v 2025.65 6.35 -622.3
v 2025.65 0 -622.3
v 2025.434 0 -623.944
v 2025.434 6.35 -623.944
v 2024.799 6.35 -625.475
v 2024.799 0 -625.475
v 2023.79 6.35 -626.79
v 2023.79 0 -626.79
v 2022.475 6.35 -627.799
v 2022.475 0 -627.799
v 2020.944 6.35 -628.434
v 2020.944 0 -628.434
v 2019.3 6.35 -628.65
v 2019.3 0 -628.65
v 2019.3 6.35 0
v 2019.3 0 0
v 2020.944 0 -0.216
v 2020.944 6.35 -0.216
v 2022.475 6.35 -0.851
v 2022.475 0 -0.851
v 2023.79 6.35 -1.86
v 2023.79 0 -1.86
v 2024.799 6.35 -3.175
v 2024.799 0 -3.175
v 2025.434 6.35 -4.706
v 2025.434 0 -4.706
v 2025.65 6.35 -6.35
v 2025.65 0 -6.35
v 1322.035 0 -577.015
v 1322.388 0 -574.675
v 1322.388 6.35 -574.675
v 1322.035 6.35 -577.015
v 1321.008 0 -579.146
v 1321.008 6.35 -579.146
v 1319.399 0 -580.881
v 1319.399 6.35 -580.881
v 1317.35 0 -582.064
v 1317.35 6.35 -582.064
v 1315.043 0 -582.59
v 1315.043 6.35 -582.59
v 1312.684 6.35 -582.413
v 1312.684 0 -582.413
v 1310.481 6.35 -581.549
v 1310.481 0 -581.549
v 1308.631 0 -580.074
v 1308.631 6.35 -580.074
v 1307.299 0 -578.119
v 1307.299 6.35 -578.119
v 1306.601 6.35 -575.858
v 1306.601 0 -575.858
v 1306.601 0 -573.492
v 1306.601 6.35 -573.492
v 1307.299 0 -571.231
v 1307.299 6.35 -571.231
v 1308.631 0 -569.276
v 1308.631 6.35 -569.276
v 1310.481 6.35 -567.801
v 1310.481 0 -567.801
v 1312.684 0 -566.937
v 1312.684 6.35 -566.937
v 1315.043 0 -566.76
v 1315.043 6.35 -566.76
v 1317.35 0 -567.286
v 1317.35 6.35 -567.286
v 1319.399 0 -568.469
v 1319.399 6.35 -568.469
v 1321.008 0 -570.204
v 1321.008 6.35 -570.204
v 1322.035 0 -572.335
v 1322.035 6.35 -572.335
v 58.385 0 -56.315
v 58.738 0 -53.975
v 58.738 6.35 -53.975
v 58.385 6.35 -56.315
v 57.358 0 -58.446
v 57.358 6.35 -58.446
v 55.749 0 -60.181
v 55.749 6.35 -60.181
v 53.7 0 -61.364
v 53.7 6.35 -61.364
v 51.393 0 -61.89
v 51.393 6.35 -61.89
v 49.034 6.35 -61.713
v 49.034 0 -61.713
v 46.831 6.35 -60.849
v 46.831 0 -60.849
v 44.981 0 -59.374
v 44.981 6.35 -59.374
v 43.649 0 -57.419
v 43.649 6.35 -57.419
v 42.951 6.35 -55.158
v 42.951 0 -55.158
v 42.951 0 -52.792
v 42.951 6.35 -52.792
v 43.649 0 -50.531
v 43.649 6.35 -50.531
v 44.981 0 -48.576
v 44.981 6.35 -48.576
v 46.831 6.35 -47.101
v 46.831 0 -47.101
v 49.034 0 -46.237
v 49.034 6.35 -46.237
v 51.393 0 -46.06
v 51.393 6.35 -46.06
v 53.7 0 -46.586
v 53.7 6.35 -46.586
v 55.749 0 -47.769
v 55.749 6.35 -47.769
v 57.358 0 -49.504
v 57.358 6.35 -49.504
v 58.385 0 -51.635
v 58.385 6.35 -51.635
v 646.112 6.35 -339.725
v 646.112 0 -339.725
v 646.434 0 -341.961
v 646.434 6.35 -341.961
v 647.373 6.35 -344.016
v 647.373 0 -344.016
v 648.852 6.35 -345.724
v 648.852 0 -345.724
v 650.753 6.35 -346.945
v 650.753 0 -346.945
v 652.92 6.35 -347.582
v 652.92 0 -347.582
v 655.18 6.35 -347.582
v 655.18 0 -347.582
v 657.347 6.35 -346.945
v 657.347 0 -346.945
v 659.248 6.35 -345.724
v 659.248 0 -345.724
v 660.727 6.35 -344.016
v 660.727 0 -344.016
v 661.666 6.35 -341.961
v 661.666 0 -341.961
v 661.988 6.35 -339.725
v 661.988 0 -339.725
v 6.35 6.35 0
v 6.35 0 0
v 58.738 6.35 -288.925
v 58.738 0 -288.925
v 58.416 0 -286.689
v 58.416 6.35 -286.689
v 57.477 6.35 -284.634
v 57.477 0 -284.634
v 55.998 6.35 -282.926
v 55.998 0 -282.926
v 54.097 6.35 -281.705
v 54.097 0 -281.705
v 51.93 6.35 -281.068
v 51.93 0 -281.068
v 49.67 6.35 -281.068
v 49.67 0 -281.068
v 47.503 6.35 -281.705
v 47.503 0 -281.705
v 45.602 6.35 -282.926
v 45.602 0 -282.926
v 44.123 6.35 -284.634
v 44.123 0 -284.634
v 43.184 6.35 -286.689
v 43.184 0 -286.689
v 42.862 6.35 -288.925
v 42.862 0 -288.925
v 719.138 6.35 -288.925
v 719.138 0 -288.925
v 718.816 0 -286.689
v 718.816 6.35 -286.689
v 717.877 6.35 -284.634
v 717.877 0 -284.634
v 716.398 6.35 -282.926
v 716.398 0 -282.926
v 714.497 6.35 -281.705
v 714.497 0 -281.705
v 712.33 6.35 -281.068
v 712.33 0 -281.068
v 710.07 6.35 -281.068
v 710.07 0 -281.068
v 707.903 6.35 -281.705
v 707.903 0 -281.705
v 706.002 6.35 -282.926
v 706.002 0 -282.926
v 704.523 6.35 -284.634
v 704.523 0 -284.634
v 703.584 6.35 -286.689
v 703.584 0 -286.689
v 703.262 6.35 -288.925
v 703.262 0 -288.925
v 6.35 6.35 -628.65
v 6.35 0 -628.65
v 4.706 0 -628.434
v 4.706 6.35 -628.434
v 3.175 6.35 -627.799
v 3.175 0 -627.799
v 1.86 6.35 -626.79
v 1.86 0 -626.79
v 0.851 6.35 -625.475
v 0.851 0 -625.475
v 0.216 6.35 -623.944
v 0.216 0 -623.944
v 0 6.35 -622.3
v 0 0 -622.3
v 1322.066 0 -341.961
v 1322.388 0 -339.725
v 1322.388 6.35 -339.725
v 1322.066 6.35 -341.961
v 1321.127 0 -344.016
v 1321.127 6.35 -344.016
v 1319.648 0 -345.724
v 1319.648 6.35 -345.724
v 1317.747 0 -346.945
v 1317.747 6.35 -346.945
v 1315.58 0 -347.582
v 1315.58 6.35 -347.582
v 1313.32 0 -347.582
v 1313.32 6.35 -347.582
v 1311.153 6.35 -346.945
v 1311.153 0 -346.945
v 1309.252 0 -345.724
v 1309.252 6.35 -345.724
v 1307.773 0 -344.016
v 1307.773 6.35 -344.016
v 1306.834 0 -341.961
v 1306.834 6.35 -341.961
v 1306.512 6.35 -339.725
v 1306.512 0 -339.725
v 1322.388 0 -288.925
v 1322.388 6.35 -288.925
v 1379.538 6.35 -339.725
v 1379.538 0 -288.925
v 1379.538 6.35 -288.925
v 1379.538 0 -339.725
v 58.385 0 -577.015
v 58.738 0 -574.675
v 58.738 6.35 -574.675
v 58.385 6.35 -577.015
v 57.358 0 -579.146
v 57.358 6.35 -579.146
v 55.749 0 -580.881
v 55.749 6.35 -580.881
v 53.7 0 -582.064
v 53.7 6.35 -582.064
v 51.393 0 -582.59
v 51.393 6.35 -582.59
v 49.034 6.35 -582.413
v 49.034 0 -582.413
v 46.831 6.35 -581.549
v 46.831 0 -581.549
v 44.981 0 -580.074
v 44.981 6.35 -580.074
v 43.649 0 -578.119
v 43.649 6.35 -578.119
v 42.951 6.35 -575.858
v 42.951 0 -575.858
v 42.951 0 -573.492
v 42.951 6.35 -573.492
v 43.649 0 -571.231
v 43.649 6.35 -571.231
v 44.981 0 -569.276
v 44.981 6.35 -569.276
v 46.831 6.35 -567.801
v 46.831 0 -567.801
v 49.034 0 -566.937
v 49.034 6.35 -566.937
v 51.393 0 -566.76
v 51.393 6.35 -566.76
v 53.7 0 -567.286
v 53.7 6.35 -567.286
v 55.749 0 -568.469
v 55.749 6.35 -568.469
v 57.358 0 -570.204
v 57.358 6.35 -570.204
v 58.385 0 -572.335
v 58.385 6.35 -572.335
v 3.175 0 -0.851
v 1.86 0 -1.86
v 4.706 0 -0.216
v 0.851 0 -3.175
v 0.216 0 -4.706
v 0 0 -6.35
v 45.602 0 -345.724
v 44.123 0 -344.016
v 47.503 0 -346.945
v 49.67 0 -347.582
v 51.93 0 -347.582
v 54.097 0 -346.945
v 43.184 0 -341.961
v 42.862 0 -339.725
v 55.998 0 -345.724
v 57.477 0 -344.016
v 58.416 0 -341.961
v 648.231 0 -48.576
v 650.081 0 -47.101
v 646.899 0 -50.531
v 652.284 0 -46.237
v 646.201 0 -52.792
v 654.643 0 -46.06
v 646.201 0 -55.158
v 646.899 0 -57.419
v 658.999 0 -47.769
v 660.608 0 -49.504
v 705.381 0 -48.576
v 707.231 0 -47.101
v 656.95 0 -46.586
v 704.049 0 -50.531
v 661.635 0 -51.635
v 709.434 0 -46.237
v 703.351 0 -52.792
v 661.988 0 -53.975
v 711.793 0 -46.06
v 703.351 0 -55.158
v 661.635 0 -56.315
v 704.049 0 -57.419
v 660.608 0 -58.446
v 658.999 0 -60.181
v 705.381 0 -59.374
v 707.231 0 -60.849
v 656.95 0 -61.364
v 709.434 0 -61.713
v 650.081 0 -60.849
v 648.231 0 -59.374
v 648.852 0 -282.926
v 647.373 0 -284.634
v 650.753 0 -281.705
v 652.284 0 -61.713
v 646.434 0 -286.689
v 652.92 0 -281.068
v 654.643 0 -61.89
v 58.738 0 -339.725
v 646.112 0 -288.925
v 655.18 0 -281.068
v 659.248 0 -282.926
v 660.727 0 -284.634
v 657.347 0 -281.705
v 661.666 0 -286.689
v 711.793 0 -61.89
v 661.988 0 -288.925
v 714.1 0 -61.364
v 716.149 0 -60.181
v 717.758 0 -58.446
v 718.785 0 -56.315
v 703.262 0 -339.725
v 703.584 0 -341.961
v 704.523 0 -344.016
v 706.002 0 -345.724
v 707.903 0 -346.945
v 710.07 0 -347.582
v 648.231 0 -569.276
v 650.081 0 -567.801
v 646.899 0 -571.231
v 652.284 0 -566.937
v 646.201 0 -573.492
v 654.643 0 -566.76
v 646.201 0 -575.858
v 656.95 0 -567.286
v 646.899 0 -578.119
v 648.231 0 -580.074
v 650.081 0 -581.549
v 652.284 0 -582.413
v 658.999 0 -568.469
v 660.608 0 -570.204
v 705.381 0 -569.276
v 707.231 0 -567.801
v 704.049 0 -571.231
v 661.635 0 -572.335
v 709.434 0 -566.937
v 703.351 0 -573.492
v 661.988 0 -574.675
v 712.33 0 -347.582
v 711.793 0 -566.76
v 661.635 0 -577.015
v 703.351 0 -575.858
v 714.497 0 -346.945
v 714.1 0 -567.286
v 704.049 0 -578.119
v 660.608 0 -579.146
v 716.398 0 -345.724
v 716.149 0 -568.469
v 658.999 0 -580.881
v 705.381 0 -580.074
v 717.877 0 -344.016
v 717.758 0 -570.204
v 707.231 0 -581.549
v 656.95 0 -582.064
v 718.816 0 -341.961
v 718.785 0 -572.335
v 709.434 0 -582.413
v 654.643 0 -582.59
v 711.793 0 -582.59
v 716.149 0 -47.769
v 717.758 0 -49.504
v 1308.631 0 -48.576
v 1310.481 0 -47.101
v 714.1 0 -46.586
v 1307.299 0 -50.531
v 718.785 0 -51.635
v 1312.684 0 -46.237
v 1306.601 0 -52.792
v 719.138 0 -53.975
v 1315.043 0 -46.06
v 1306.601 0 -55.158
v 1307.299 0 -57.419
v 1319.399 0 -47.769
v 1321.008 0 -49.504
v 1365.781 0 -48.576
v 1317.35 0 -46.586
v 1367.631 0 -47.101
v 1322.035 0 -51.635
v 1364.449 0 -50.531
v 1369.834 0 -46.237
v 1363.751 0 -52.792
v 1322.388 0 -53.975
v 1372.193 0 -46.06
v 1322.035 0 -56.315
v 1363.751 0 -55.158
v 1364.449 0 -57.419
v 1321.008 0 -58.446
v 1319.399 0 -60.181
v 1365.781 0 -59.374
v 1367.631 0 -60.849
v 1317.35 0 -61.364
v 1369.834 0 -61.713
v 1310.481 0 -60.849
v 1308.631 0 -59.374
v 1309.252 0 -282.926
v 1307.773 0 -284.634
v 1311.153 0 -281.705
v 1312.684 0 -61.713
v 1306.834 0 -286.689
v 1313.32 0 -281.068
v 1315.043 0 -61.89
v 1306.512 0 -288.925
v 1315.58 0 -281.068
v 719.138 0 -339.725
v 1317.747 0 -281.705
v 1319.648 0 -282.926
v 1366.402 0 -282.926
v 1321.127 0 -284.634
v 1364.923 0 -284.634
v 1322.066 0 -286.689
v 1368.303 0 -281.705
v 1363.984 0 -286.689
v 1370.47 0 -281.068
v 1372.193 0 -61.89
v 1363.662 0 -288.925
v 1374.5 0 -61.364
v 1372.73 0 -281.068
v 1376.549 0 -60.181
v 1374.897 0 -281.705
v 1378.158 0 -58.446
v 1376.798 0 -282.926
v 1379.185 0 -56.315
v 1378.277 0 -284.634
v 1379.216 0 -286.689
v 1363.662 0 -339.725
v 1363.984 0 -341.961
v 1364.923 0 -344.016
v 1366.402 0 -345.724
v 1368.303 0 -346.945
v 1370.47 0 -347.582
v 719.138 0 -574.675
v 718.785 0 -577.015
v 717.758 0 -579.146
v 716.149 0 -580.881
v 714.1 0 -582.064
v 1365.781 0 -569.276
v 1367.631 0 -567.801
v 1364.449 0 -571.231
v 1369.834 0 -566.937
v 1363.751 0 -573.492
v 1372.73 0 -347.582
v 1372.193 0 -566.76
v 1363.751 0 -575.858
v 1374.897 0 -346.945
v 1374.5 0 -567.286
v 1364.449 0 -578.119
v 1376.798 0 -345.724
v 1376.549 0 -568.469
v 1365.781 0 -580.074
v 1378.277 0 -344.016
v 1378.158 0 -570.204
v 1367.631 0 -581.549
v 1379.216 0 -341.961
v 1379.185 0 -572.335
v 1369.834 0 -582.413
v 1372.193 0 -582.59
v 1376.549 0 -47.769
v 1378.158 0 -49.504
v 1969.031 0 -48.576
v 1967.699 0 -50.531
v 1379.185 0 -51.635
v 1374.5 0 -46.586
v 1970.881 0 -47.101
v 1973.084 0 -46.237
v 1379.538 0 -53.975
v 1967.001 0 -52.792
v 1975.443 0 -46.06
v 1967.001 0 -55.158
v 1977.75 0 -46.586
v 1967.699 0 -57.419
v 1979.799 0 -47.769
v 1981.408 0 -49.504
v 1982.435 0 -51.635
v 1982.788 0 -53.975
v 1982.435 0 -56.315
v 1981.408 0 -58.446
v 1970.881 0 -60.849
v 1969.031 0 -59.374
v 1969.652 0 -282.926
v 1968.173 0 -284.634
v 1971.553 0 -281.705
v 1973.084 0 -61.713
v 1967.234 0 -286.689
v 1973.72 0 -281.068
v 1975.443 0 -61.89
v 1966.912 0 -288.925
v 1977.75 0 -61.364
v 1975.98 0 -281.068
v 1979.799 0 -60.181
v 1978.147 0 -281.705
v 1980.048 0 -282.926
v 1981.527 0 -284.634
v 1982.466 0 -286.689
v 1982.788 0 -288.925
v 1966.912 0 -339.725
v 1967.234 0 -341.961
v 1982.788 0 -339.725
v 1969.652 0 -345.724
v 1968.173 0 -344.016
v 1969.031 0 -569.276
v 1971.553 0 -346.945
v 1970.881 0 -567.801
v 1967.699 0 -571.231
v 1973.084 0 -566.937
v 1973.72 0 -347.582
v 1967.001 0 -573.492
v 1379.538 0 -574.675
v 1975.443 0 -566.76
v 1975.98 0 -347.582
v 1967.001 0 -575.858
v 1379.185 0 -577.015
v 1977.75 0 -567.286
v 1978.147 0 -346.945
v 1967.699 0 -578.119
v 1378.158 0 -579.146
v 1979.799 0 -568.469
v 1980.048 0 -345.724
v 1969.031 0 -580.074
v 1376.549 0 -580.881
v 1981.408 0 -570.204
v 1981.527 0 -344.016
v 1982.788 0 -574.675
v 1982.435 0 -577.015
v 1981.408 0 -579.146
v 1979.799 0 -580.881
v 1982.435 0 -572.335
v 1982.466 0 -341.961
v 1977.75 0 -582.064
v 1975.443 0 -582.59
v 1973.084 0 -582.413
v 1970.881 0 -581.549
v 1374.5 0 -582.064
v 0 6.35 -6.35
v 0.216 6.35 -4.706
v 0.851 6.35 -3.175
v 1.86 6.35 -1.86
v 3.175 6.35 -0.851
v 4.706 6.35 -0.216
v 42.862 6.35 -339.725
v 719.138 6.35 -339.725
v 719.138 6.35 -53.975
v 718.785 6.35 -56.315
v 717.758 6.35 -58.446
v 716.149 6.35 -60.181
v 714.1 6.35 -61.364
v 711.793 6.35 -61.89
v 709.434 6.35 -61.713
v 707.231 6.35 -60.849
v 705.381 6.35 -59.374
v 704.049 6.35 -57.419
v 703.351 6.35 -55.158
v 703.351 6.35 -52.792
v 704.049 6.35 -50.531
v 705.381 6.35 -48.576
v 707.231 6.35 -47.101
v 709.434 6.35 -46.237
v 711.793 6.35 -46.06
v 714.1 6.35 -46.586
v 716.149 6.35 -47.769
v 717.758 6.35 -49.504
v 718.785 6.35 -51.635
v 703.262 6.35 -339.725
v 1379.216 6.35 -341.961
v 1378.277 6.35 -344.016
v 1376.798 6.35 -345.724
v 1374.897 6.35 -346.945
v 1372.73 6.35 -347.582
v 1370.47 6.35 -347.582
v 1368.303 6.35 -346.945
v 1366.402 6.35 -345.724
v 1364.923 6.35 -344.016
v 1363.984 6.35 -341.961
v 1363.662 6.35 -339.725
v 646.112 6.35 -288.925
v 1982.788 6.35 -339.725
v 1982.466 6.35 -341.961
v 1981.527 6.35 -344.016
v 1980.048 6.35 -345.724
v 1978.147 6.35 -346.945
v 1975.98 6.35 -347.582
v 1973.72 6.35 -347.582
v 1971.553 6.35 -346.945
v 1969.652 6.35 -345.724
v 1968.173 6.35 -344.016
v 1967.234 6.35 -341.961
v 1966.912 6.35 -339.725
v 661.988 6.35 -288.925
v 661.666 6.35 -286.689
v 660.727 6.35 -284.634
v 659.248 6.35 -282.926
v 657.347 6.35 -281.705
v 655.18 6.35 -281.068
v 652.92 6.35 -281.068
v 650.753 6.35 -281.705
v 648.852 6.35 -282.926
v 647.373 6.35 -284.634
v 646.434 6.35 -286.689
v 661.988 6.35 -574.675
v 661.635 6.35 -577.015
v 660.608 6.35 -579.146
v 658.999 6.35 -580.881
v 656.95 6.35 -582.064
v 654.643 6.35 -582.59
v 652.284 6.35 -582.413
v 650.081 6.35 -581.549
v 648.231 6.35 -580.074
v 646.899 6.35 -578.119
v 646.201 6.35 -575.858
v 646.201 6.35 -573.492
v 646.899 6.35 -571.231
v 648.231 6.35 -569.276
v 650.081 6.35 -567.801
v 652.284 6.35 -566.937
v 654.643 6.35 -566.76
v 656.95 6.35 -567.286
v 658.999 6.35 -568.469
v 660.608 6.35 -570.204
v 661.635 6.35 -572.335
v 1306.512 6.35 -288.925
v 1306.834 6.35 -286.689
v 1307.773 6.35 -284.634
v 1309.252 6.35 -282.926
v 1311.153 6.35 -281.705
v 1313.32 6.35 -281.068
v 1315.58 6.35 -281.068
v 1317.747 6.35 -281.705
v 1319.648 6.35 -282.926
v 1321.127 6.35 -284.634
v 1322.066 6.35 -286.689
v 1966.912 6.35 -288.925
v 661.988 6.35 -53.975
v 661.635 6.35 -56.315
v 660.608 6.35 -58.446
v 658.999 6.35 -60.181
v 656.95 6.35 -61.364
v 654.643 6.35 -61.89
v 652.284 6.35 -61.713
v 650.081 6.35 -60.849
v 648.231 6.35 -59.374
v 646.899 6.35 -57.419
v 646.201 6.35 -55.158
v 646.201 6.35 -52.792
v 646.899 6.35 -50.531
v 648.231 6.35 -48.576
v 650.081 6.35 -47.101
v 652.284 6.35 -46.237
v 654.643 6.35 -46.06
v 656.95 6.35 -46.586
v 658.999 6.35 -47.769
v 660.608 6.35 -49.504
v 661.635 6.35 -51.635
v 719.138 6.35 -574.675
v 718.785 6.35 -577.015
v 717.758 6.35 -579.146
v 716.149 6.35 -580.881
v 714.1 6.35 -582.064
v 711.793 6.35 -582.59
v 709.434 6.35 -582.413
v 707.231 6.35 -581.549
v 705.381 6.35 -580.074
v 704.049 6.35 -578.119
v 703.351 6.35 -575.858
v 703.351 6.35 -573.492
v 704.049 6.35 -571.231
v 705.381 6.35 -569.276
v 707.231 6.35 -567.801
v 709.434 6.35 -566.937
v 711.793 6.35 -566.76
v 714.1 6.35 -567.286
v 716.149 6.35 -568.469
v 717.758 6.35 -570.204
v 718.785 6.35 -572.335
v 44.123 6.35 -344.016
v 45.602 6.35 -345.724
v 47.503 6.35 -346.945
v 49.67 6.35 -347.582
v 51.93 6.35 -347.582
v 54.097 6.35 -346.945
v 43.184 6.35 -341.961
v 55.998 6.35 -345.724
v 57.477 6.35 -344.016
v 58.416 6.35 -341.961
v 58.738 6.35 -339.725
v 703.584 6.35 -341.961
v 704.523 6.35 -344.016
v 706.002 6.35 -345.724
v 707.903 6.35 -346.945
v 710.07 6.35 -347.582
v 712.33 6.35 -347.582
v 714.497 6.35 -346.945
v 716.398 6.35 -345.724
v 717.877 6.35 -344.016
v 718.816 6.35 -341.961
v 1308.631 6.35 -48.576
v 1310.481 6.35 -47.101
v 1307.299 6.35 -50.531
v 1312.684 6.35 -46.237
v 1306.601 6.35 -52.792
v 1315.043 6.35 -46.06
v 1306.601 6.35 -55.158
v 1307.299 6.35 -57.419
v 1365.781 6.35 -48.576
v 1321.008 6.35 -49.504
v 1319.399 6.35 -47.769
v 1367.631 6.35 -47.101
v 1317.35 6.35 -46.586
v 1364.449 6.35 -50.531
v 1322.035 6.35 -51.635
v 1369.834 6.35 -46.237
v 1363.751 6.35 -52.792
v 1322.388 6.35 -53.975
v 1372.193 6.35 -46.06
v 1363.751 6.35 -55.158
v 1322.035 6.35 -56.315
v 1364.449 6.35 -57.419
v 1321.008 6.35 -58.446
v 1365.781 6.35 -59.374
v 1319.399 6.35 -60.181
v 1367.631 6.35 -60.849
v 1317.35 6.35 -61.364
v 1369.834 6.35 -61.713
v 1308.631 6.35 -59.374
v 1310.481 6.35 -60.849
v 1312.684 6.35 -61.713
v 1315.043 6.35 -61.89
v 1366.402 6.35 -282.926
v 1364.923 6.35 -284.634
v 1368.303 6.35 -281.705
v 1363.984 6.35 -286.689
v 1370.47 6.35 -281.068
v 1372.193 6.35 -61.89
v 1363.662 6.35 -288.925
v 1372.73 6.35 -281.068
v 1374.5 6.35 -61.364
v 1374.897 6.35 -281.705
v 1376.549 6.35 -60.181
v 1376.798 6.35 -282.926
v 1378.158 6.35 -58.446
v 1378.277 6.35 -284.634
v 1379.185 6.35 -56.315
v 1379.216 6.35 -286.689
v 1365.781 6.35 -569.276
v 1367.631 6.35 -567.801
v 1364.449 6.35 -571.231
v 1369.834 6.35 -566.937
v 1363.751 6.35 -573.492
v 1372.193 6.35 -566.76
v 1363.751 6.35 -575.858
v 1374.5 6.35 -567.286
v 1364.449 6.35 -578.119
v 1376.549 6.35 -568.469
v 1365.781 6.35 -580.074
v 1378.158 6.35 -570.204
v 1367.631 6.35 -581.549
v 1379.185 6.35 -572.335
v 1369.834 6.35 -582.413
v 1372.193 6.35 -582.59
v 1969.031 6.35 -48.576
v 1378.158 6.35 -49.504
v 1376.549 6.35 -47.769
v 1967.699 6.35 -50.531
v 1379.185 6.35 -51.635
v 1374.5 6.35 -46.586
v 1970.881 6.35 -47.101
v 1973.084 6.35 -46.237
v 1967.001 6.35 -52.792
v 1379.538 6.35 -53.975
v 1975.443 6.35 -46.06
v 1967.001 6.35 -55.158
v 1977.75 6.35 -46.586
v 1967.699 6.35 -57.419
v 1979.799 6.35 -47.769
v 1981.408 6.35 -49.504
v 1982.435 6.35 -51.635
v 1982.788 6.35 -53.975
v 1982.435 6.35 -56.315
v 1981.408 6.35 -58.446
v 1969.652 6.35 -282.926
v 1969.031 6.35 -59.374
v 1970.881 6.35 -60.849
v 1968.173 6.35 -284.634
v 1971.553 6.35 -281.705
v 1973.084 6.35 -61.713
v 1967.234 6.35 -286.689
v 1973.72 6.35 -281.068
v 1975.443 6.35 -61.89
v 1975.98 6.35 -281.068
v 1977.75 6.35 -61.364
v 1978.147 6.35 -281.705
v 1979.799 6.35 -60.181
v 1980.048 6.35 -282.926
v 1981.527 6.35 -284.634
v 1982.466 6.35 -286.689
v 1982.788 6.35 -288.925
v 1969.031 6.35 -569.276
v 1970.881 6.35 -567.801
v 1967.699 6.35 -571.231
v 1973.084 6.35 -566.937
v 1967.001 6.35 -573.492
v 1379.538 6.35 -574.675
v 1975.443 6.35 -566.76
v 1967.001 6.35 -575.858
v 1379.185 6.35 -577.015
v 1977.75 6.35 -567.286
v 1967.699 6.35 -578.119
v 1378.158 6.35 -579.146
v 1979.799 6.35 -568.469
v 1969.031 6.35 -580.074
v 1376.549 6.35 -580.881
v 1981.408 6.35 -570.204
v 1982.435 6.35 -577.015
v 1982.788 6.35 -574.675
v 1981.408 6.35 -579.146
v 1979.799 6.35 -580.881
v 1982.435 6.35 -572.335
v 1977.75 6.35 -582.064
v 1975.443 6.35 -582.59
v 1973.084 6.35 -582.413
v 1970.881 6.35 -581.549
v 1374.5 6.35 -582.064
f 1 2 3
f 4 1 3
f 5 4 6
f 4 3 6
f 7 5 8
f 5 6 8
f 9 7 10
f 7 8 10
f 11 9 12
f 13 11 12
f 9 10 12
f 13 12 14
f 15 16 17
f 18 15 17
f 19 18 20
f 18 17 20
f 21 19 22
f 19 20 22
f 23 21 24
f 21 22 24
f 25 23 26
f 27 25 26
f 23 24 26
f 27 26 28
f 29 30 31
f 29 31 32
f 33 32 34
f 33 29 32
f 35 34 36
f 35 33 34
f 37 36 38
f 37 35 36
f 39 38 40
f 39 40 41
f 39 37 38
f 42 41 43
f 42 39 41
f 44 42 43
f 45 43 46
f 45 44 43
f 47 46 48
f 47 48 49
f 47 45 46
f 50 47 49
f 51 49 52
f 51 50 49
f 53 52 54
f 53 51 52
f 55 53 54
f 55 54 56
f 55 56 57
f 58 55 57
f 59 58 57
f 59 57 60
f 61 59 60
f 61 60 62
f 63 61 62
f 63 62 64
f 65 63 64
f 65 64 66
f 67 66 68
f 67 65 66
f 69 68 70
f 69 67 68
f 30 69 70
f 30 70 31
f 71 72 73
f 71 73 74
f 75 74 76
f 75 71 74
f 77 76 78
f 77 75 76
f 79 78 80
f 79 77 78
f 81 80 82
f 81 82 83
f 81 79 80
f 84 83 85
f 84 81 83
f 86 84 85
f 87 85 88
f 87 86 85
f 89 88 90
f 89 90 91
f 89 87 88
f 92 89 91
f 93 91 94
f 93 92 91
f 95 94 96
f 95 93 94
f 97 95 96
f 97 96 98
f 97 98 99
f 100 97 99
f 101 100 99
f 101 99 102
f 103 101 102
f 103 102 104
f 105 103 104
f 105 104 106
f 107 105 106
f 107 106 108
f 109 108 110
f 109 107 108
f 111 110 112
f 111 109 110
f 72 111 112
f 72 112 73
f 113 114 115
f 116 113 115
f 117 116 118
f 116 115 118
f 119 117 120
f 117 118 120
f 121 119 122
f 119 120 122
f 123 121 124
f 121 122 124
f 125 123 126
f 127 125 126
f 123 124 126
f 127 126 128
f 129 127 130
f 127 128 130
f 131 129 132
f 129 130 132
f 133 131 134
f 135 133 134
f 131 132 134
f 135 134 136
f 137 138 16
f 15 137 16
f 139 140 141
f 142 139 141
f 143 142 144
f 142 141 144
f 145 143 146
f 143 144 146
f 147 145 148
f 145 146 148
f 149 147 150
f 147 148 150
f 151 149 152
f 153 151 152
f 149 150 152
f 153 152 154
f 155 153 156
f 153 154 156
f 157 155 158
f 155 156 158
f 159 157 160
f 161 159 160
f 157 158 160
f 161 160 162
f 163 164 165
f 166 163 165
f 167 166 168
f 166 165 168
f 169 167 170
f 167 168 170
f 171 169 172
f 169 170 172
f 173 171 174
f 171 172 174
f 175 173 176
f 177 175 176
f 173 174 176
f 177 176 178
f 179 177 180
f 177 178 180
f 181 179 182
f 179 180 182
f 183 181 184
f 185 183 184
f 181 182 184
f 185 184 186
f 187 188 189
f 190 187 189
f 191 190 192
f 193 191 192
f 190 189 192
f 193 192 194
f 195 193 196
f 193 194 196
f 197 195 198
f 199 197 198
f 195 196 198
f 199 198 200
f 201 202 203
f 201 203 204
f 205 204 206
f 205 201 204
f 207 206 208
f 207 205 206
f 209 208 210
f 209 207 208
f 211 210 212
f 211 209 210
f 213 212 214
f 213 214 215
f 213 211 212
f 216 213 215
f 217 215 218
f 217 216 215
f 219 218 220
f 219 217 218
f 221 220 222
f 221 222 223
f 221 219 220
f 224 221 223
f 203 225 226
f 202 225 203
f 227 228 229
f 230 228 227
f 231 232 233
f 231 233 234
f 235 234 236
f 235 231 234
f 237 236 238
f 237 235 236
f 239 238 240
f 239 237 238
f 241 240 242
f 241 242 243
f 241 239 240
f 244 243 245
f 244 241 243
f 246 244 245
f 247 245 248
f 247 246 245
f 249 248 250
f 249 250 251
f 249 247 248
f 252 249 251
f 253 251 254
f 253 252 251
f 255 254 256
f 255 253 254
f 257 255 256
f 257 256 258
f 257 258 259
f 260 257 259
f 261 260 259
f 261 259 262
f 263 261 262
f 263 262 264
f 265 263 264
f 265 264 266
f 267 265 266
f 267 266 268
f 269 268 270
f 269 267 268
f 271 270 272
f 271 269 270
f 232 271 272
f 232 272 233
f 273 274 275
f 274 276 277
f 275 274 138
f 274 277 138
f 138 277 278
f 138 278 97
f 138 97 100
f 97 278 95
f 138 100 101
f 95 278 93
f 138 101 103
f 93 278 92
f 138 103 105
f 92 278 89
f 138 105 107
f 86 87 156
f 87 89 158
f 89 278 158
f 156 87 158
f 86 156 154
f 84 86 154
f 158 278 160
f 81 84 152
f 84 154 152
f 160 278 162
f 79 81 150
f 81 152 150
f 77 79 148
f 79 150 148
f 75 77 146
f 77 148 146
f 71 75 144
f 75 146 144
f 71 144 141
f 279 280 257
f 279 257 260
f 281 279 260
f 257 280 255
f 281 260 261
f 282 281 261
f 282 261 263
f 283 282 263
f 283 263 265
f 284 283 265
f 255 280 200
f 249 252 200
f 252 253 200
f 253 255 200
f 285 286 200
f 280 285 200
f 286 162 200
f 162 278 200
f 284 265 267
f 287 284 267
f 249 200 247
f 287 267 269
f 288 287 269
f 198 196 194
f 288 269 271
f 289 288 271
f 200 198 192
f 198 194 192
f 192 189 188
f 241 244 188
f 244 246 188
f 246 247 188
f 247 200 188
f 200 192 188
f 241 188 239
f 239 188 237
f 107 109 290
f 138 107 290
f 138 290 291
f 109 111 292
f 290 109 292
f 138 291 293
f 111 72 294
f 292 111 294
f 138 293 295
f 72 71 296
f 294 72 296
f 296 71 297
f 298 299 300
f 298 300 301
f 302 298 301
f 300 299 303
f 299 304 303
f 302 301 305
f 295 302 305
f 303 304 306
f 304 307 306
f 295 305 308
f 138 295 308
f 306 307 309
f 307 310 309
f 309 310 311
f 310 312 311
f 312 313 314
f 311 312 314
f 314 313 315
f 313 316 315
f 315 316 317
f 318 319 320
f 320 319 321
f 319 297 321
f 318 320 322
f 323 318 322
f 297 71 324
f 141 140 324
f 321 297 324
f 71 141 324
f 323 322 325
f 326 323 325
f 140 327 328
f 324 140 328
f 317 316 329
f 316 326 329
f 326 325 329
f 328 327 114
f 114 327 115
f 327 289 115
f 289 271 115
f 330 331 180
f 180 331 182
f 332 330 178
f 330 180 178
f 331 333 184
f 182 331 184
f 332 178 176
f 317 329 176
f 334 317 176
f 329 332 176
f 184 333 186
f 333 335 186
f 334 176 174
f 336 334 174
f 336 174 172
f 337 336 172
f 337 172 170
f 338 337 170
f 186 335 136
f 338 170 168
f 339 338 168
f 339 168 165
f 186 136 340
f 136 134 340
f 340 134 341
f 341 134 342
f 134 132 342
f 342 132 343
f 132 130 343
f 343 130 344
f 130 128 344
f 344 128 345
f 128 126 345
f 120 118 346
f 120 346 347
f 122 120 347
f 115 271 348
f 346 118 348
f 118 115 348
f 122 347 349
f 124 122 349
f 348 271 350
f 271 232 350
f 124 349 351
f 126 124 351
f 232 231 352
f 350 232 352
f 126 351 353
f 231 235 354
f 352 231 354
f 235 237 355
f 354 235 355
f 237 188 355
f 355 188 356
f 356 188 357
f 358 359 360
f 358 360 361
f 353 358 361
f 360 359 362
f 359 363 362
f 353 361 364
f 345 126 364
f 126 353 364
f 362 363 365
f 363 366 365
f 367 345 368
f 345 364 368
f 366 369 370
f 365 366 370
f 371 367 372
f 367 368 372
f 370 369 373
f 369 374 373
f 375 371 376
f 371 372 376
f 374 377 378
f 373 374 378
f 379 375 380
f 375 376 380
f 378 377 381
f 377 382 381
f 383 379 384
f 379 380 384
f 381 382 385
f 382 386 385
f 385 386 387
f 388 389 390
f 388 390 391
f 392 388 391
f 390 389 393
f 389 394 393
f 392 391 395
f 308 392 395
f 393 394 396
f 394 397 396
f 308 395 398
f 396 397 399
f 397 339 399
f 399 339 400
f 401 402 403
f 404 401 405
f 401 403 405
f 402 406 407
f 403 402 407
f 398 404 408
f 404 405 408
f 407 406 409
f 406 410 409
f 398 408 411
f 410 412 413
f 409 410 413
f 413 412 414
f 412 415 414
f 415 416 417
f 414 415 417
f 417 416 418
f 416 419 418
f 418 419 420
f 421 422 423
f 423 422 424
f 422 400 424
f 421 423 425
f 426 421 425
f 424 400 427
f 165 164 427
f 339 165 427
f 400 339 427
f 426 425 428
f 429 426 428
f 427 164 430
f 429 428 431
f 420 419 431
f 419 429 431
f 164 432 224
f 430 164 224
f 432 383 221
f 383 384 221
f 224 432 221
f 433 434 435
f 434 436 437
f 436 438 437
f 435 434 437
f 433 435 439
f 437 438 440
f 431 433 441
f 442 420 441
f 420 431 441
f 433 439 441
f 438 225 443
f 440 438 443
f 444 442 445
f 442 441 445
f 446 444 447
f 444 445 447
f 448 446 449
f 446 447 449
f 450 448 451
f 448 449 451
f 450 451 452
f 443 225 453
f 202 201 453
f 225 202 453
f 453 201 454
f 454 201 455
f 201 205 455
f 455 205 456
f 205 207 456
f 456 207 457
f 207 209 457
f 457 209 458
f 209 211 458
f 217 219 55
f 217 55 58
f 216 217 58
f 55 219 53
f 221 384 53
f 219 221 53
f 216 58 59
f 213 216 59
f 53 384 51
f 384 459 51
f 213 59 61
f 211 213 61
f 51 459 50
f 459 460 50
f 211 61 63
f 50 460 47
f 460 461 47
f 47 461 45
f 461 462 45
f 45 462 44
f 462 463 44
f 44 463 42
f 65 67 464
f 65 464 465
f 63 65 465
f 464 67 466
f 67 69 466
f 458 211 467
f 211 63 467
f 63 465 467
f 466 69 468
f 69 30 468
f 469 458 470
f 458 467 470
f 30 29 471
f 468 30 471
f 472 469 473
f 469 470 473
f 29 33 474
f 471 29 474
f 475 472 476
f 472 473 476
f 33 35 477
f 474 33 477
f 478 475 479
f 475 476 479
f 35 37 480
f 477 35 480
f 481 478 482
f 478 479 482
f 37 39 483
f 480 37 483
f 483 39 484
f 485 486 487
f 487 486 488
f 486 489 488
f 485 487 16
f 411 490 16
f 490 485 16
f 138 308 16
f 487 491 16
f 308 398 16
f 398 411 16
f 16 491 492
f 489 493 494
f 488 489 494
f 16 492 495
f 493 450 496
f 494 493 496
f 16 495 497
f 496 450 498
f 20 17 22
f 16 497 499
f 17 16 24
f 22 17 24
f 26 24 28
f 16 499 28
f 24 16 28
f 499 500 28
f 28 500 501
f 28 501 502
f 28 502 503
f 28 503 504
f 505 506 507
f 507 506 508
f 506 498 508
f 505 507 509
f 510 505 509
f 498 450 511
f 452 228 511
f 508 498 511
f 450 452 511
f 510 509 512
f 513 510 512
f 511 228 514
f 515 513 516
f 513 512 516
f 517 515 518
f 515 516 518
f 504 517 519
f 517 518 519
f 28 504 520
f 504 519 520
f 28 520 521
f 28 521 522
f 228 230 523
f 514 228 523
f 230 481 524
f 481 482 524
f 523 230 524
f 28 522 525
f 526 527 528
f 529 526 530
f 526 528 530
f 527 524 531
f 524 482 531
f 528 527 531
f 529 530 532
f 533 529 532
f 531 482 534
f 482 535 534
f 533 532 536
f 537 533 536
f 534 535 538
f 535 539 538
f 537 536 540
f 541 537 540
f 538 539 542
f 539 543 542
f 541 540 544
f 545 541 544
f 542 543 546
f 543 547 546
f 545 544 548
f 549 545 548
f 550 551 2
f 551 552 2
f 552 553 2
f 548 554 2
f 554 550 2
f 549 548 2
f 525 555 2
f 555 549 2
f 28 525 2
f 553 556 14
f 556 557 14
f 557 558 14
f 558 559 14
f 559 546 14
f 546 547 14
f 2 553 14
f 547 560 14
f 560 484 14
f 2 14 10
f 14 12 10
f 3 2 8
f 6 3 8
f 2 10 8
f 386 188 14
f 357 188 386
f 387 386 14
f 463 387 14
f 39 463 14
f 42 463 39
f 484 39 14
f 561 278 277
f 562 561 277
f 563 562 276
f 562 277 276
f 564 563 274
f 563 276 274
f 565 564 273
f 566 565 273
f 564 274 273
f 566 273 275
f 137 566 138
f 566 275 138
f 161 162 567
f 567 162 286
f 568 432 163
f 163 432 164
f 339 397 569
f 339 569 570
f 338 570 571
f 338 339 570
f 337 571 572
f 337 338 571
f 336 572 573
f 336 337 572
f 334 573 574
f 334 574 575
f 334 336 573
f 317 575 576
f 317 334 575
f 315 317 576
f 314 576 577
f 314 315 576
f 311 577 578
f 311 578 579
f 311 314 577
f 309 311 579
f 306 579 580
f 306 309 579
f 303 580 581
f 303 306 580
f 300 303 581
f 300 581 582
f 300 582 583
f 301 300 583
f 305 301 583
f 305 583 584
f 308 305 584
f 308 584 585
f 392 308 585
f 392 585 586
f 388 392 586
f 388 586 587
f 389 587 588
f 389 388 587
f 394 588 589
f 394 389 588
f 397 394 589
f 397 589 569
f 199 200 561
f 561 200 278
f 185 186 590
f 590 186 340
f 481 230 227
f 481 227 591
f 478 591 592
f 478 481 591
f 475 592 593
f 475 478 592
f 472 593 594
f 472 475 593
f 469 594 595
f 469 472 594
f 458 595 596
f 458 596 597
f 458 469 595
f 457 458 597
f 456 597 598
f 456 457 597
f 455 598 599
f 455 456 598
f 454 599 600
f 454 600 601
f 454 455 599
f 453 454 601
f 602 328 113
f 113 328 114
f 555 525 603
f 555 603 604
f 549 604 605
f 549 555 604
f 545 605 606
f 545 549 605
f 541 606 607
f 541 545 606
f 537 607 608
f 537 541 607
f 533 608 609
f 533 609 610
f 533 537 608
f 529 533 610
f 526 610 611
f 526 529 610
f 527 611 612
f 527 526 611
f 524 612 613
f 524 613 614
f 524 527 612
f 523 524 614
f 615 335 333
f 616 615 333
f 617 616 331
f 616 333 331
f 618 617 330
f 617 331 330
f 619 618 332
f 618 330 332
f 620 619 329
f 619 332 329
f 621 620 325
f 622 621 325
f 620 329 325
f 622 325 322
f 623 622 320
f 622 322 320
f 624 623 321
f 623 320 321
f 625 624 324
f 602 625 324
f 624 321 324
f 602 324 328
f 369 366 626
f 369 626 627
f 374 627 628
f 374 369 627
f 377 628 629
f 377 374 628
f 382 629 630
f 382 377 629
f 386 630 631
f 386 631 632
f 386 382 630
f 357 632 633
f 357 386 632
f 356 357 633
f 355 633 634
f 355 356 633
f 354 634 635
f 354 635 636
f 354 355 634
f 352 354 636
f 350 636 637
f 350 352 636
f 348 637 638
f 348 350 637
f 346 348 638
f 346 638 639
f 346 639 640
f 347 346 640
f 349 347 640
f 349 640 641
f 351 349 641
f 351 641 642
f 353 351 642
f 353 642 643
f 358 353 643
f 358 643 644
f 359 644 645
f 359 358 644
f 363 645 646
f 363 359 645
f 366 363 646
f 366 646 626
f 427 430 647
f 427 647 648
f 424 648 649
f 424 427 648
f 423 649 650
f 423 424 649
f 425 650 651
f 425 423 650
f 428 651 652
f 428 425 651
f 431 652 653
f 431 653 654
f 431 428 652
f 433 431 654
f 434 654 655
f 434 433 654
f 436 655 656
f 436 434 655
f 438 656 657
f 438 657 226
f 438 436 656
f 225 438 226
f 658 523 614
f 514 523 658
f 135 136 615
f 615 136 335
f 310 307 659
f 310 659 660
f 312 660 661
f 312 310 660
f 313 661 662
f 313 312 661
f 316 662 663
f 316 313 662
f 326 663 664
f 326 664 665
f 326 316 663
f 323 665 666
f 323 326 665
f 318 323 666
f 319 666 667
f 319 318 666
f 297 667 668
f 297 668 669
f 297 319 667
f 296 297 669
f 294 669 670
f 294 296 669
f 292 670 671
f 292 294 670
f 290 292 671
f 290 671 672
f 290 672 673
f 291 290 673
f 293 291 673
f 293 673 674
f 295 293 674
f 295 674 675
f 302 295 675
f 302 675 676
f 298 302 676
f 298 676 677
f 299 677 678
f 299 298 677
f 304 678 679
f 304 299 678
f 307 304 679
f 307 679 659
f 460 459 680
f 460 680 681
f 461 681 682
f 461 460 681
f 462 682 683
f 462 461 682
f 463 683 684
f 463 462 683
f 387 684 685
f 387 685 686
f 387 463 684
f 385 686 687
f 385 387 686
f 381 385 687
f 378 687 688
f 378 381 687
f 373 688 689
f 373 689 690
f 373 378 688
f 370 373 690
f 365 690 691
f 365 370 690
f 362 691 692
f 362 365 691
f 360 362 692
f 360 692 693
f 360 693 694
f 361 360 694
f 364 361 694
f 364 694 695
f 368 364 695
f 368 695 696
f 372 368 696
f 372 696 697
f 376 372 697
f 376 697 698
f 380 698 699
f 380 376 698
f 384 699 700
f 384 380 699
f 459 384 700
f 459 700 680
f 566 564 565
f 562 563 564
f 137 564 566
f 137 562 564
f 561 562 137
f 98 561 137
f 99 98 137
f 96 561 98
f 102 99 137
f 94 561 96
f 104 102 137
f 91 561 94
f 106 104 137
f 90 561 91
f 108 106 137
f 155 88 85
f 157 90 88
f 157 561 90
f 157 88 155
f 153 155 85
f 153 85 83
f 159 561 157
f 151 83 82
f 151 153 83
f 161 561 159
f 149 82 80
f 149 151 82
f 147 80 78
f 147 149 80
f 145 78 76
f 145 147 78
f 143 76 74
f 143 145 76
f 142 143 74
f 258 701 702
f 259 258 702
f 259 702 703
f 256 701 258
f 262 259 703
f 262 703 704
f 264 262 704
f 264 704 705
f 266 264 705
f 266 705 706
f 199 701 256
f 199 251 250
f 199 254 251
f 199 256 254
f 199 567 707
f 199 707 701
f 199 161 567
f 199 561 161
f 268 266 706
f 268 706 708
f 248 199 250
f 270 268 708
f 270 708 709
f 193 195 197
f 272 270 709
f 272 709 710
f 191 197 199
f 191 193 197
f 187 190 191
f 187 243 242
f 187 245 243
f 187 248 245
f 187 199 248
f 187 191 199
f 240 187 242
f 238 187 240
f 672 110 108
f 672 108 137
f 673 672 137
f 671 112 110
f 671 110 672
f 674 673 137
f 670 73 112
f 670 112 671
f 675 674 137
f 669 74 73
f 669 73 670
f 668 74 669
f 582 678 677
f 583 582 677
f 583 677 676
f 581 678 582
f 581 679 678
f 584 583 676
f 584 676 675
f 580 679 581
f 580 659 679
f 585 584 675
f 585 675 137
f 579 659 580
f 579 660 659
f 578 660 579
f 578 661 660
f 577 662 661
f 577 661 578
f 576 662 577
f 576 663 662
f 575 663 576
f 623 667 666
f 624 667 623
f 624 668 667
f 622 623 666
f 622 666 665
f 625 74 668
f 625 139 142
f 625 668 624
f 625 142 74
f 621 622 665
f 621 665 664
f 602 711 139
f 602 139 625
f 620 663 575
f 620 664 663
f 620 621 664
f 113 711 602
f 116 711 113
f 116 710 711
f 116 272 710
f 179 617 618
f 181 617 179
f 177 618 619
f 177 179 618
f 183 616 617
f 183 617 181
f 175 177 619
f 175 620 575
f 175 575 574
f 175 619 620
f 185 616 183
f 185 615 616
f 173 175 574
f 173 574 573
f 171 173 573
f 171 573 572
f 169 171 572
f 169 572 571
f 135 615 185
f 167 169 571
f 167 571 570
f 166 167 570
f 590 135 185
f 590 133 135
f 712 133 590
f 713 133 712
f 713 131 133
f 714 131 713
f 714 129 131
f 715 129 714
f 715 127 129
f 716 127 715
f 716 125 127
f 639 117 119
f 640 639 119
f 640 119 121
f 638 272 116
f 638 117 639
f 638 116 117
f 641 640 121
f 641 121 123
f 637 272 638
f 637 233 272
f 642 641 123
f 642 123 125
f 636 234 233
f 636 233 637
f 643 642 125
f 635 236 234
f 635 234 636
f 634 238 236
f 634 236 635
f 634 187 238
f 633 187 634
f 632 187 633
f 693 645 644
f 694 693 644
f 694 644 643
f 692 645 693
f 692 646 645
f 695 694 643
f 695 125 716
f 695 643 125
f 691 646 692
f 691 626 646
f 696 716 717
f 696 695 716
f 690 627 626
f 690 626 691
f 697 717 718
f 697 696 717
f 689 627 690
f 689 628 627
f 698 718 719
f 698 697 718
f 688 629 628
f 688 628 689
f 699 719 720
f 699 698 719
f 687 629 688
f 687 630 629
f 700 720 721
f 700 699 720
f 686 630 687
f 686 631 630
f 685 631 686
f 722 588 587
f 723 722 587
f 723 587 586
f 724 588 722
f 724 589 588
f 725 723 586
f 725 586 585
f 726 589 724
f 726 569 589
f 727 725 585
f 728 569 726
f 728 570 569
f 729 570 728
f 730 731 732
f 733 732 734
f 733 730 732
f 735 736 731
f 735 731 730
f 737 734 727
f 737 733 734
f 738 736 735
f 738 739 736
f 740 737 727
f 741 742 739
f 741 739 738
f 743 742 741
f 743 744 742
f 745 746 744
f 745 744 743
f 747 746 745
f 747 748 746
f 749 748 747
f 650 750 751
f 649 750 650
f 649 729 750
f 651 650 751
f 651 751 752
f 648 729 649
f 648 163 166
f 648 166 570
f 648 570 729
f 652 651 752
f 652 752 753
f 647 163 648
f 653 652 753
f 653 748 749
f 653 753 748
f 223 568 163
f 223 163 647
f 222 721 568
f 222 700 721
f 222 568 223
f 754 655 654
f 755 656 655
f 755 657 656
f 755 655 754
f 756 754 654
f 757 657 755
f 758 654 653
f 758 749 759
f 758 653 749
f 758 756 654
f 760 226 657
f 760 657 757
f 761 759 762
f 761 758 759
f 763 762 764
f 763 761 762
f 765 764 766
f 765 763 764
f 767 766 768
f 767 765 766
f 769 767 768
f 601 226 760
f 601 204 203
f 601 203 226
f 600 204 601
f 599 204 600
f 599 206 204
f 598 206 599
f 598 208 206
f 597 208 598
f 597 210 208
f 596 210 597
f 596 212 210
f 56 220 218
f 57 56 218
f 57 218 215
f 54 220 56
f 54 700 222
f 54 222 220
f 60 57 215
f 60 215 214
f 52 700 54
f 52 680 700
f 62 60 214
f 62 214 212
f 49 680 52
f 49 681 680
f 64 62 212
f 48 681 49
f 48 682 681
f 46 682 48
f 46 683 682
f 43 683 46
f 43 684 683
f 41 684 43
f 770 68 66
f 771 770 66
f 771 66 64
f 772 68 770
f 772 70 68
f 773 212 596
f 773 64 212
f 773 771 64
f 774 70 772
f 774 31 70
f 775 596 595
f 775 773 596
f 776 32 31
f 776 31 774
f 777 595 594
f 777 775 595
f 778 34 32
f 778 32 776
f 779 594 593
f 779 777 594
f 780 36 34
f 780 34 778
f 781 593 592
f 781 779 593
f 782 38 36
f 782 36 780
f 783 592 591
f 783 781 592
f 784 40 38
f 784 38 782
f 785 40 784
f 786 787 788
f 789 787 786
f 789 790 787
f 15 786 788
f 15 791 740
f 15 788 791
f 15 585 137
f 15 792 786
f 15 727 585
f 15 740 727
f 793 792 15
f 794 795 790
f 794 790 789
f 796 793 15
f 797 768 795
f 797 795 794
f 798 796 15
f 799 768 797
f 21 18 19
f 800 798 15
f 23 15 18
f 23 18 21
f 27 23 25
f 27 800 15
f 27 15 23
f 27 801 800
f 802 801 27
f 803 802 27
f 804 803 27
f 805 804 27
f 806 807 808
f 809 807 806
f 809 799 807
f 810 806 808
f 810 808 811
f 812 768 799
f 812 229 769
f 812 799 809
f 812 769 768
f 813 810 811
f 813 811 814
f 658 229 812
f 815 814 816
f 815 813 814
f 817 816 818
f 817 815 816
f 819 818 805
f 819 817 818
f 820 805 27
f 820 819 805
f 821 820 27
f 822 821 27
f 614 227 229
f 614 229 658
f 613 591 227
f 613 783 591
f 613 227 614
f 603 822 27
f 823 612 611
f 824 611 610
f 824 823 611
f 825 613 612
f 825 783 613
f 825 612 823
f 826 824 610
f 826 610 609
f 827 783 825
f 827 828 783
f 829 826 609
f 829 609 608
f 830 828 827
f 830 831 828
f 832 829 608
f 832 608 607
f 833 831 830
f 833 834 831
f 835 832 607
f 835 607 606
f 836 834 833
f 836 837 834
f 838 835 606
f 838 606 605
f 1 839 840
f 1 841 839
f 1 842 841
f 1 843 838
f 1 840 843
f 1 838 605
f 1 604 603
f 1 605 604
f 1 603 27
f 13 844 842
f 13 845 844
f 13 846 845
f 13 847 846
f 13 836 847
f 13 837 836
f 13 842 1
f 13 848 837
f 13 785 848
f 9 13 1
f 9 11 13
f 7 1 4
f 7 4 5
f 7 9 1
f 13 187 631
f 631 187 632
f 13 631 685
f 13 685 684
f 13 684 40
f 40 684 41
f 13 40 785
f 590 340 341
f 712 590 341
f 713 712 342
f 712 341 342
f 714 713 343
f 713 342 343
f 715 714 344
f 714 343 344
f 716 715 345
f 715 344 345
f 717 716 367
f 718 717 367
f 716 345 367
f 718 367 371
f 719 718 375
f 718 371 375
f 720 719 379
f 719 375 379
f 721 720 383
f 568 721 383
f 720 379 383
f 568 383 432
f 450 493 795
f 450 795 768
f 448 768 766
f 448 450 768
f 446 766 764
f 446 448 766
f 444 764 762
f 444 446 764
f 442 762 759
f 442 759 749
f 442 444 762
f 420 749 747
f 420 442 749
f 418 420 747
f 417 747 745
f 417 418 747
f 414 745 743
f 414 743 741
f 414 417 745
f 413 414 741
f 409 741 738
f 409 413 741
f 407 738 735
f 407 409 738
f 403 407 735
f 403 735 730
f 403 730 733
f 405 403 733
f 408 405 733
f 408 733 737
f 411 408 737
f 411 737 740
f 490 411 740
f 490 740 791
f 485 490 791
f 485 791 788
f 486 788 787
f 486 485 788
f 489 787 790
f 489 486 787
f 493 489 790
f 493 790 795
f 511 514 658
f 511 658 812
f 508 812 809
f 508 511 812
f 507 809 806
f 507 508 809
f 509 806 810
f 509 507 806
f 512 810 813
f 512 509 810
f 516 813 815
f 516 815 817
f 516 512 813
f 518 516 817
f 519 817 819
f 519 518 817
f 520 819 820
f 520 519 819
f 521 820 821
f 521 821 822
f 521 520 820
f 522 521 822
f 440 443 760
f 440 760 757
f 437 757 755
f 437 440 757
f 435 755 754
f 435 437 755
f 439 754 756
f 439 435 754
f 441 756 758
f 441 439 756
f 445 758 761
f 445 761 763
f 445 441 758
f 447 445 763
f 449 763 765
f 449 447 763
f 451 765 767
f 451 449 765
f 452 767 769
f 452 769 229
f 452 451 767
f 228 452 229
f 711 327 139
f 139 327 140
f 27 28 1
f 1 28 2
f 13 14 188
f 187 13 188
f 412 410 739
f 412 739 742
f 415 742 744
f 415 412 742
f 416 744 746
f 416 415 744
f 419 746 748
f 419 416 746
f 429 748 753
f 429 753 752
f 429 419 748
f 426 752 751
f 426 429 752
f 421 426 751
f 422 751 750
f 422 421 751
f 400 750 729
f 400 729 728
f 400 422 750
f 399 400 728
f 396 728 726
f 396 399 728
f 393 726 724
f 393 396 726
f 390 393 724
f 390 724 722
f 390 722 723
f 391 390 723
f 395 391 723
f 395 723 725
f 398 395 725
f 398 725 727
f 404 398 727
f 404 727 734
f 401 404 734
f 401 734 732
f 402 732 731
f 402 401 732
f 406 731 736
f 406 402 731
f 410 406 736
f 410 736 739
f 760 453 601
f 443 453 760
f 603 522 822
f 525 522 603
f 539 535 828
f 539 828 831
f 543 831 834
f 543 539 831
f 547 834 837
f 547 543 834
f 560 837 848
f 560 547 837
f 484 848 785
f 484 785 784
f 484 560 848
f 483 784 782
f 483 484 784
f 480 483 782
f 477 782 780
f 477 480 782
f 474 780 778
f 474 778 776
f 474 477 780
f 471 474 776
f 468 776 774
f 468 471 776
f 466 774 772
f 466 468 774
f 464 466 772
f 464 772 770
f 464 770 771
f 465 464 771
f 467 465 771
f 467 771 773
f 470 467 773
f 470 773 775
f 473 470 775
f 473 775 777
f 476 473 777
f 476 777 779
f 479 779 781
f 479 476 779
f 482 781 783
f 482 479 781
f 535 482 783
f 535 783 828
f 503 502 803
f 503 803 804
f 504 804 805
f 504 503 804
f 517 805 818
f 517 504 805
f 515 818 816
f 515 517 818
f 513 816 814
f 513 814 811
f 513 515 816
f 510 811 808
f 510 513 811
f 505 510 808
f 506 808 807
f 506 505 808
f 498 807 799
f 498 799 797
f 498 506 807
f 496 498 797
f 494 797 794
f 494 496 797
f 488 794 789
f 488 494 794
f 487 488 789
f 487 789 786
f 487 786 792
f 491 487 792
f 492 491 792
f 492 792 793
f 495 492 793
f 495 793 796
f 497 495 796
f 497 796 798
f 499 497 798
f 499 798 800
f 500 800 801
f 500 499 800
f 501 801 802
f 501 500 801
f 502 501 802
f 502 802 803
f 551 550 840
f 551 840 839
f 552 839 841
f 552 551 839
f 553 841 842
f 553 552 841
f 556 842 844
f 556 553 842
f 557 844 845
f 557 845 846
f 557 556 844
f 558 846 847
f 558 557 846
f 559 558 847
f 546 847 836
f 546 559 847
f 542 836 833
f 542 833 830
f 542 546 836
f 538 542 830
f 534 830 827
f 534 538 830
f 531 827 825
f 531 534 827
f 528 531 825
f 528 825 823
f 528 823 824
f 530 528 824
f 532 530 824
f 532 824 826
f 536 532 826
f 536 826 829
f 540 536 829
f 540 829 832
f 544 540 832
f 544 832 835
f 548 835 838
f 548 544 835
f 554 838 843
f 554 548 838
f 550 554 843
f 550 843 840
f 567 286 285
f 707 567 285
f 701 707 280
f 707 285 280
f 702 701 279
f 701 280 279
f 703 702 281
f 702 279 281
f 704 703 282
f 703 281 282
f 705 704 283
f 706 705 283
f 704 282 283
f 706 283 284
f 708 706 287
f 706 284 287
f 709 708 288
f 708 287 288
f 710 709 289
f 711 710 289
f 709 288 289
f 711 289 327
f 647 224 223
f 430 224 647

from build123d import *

# Parameters (mm, degrees)
SKETCH1_R           = 7.9375
BOSS_EXTRUDE1_DEPTH = 6.35


with BuildPart() as part:
    # Sketch1 → Boss-Extrude1 (new body)
    with BuildSketch(Plane(origin=(0, 0, 0), x_dir=(1, 0, 0), z_dir=(0, 1, 0))):
        with BuildLine():
            Line((6.35, 0), (2019.3, 0))
            ThreePointArc((2019.3, 0), (2023.790128061, 1.859871939), (2025.65, 6.35))
            Line((2025.65, 6.35), (2025.65, 622.3))
            ThreePointArc((2025.65, 622.3), (2023.790128061, 626.790128061), (2019.3, 628.65))
            Line((2019.3, 628.65), (6.35, 628.65))
            ThreePointArc((6.35, 628.65), (1.859871939, 626.790128061), (0, 622.3))
            Line((0, 622.3), (0, 6.35))
            ThreePointArc((0, 6.35), (1.859871939, 1.859871939), (6.35, 0))
        make_face()
        with Locations((50.8, 574.675)):
            Circle(SKETCH1_R, mode=Mode.SUBTRACT)
        with Locations((1974.85, 574.675)):
            Circle(SKETCH1_R, mode=Mode.SUBTRACT)
        with Locations((1974.85, 53.975)):
            Circle(SKETCH1_R, mode=Mode.SUBTRACT)
        with Locations((50.8, 53.975)):
            Circle(SKETCH1_R, mode=Mode.SUBTRACT)
        with Locations((654.05, 574.675)):
            Circle(SKETCH1_R, mode=Mode.SUBTRACT)
        with Locations((1371.6, 574.675)):
            Circle(SKETCH1_R, mode=Mode.SUBTRACT)
        with Locations((711.2, 574.675)):
            Circle(SKETCH1_R, mode=Mode.SUBTRACT)
        with Locations((711.2, 53.975)):
            Circle(SKETCH1_R, mode=Mode.SUBTRACT)
        with Locations((654.05, 53.975)):
            Circle(SKETCH1_R, mode=Mode.SUBTRACT)
        with Locations((1314.45, 574.675)):
            Circle(SKETCH1_R, mode=Mode.SUBTRACT)
        with Locations((1314.45, 53.975)):
            Circle(SKETCH1_R, mode=Mode.SUBTRACT)
        with Locations((1371.6, 53.975)):
            Circle(SKETCH1_R, mode=Mode.SUBTRACT)
        with BuildLine():
            Line((58.7375, 339.725), (58.7375, 288.925))
            ThreePointArc((58.7375, 288.925), (50.8, 280.9875), (42.8625, 288.925))
            Line((42.8625, 288.925), (42.8625, 339.725))
            ThreePointArc((42.8625, 339.725), (50.8, 347.6625), (58.7375, 339.725))
        make_face(mode=Mode.SUBTRACT)
        with BuildLine():
            Line((661.9875, 339.725), (661.9875, 288.925))
            ThreePointArc((661.9875, 288.925), (654.05, 280.9875), (646.1125, 288.925))
            Line((646.1125, 288.925), (646.1125, 339.725))
            ThreePointArc((646.1125, 339.725), (654.05, 347.6625), (661.9875, 339.725))
        make_face(mode=Mode.SUBTRACT)
        with BuildLine():
            Line((719.1375, 339.725), (719.1375, 288.925))
            ThreePointArc((719.1375, 288.925), (711.2, 280.9875), (703.2625, 288.925))
            Line((703.2625, 288.925), (703.2625, 339.725))
            ThreePointArc((703.2625, 339.725), (711.2, 347.6625), (719.1375, 339.725))
        make_face(mode=Mode.SUBTRACT)
        with BuildLine():
            Line((1966.9125, 339.725), (1966.9125, 288.925))
            ThreePointArc((1966.9125, 288.925), (1974.85, 280.9875), (1982.7875, 288.925))
            Line((1982.7875, 288.925), (1982.7875, 339.725))
            ThreePointArc((1982.7875, 339.725), (1974.85, 347.6625), (1966.9125, 339.725))
        make_face(mode=Mode.SUBTRACT)
        with BuildLine():
            Line((1306.5125, 339.725), (1306.5125, 288.925))
            ThreePointArc((1306.5125, 288.925), (1314.45, 280.9875), (1322.3875, 288.925))
            Line((1322.3875, 288.925), (1322.3875, 339.725))
            ThreePointArc((1322.3875, 339.725), (1314.45, 347.6625), (1306.5125, 339.725))
        make_face(mode=Mode.SUBTRACT)
        with BuildLine():
            Line((1363.6625, 339.725), (1363.6625, 288.925))
            ThreePointArc((1363.6625, 288.925), (1371.6, 280.9875), (1379.5375, 288.925))
            Line((1379.5375, 288.925), (1379.5375, 339.725))
            ThreePointArc((1379.5375, 339.725), (1371.6, 347.6625), (1363.6625, 339.725))
        make_face(mode=Mode.SUBTRACT)
    extrude(amount=BOSS_EXTRUDE1_DEPTH)


solid = part.part
